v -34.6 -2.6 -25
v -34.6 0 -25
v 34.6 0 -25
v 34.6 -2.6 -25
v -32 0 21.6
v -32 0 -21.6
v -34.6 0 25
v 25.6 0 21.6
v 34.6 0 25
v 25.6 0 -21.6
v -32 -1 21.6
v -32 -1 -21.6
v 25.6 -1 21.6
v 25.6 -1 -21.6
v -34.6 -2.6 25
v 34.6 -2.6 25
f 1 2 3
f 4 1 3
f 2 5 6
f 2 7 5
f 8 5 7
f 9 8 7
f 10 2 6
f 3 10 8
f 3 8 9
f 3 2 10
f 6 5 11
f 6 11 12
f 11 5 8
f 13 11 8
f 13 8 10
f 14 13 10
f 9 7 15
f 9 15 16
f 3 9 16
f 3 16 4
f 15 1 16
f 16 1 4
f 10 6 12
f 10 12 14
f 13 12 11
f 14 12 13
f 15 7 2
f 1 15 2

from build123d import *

# Parameters (mm, degrees)
LCD_W               = 69.2
LCD_H               = 50
EXTRUDE_2_DEPTH     = 2.6
LCD_3_W             = 57.6
LCD_3_H             = 43.2
CUT_EXTRUDE_1_DEPTH = 1


with BuildPart() as part:
    # LCD外壳 → 凸台-拉伸2 (new body)
    with BuildSketch(Plane(origin=(0, 0, 0), x_dir=(1, 0, 0), z_dir=(0, 1, 0))):
        Rectangle(LCD_W, LCD_H)
    extrude(amount=-EXTRUDE_2_DEPTH)

    # LCD外壳<3> → 切除-拉伸1 (cut)
    with BuildSketch(Plane(origin=(0, 0, 0), x_dir=(1, 0, 0), z_dir=(0, 1, 0))):
        with Locations((-3.2, 0)):
            Rectangle(LCD_3_W, LCD_3_H)
    extrude(amount=-CUT_EXTRUDE_1_DEPTH, mode=Mode.SUBTRACT)


solid = part.part
